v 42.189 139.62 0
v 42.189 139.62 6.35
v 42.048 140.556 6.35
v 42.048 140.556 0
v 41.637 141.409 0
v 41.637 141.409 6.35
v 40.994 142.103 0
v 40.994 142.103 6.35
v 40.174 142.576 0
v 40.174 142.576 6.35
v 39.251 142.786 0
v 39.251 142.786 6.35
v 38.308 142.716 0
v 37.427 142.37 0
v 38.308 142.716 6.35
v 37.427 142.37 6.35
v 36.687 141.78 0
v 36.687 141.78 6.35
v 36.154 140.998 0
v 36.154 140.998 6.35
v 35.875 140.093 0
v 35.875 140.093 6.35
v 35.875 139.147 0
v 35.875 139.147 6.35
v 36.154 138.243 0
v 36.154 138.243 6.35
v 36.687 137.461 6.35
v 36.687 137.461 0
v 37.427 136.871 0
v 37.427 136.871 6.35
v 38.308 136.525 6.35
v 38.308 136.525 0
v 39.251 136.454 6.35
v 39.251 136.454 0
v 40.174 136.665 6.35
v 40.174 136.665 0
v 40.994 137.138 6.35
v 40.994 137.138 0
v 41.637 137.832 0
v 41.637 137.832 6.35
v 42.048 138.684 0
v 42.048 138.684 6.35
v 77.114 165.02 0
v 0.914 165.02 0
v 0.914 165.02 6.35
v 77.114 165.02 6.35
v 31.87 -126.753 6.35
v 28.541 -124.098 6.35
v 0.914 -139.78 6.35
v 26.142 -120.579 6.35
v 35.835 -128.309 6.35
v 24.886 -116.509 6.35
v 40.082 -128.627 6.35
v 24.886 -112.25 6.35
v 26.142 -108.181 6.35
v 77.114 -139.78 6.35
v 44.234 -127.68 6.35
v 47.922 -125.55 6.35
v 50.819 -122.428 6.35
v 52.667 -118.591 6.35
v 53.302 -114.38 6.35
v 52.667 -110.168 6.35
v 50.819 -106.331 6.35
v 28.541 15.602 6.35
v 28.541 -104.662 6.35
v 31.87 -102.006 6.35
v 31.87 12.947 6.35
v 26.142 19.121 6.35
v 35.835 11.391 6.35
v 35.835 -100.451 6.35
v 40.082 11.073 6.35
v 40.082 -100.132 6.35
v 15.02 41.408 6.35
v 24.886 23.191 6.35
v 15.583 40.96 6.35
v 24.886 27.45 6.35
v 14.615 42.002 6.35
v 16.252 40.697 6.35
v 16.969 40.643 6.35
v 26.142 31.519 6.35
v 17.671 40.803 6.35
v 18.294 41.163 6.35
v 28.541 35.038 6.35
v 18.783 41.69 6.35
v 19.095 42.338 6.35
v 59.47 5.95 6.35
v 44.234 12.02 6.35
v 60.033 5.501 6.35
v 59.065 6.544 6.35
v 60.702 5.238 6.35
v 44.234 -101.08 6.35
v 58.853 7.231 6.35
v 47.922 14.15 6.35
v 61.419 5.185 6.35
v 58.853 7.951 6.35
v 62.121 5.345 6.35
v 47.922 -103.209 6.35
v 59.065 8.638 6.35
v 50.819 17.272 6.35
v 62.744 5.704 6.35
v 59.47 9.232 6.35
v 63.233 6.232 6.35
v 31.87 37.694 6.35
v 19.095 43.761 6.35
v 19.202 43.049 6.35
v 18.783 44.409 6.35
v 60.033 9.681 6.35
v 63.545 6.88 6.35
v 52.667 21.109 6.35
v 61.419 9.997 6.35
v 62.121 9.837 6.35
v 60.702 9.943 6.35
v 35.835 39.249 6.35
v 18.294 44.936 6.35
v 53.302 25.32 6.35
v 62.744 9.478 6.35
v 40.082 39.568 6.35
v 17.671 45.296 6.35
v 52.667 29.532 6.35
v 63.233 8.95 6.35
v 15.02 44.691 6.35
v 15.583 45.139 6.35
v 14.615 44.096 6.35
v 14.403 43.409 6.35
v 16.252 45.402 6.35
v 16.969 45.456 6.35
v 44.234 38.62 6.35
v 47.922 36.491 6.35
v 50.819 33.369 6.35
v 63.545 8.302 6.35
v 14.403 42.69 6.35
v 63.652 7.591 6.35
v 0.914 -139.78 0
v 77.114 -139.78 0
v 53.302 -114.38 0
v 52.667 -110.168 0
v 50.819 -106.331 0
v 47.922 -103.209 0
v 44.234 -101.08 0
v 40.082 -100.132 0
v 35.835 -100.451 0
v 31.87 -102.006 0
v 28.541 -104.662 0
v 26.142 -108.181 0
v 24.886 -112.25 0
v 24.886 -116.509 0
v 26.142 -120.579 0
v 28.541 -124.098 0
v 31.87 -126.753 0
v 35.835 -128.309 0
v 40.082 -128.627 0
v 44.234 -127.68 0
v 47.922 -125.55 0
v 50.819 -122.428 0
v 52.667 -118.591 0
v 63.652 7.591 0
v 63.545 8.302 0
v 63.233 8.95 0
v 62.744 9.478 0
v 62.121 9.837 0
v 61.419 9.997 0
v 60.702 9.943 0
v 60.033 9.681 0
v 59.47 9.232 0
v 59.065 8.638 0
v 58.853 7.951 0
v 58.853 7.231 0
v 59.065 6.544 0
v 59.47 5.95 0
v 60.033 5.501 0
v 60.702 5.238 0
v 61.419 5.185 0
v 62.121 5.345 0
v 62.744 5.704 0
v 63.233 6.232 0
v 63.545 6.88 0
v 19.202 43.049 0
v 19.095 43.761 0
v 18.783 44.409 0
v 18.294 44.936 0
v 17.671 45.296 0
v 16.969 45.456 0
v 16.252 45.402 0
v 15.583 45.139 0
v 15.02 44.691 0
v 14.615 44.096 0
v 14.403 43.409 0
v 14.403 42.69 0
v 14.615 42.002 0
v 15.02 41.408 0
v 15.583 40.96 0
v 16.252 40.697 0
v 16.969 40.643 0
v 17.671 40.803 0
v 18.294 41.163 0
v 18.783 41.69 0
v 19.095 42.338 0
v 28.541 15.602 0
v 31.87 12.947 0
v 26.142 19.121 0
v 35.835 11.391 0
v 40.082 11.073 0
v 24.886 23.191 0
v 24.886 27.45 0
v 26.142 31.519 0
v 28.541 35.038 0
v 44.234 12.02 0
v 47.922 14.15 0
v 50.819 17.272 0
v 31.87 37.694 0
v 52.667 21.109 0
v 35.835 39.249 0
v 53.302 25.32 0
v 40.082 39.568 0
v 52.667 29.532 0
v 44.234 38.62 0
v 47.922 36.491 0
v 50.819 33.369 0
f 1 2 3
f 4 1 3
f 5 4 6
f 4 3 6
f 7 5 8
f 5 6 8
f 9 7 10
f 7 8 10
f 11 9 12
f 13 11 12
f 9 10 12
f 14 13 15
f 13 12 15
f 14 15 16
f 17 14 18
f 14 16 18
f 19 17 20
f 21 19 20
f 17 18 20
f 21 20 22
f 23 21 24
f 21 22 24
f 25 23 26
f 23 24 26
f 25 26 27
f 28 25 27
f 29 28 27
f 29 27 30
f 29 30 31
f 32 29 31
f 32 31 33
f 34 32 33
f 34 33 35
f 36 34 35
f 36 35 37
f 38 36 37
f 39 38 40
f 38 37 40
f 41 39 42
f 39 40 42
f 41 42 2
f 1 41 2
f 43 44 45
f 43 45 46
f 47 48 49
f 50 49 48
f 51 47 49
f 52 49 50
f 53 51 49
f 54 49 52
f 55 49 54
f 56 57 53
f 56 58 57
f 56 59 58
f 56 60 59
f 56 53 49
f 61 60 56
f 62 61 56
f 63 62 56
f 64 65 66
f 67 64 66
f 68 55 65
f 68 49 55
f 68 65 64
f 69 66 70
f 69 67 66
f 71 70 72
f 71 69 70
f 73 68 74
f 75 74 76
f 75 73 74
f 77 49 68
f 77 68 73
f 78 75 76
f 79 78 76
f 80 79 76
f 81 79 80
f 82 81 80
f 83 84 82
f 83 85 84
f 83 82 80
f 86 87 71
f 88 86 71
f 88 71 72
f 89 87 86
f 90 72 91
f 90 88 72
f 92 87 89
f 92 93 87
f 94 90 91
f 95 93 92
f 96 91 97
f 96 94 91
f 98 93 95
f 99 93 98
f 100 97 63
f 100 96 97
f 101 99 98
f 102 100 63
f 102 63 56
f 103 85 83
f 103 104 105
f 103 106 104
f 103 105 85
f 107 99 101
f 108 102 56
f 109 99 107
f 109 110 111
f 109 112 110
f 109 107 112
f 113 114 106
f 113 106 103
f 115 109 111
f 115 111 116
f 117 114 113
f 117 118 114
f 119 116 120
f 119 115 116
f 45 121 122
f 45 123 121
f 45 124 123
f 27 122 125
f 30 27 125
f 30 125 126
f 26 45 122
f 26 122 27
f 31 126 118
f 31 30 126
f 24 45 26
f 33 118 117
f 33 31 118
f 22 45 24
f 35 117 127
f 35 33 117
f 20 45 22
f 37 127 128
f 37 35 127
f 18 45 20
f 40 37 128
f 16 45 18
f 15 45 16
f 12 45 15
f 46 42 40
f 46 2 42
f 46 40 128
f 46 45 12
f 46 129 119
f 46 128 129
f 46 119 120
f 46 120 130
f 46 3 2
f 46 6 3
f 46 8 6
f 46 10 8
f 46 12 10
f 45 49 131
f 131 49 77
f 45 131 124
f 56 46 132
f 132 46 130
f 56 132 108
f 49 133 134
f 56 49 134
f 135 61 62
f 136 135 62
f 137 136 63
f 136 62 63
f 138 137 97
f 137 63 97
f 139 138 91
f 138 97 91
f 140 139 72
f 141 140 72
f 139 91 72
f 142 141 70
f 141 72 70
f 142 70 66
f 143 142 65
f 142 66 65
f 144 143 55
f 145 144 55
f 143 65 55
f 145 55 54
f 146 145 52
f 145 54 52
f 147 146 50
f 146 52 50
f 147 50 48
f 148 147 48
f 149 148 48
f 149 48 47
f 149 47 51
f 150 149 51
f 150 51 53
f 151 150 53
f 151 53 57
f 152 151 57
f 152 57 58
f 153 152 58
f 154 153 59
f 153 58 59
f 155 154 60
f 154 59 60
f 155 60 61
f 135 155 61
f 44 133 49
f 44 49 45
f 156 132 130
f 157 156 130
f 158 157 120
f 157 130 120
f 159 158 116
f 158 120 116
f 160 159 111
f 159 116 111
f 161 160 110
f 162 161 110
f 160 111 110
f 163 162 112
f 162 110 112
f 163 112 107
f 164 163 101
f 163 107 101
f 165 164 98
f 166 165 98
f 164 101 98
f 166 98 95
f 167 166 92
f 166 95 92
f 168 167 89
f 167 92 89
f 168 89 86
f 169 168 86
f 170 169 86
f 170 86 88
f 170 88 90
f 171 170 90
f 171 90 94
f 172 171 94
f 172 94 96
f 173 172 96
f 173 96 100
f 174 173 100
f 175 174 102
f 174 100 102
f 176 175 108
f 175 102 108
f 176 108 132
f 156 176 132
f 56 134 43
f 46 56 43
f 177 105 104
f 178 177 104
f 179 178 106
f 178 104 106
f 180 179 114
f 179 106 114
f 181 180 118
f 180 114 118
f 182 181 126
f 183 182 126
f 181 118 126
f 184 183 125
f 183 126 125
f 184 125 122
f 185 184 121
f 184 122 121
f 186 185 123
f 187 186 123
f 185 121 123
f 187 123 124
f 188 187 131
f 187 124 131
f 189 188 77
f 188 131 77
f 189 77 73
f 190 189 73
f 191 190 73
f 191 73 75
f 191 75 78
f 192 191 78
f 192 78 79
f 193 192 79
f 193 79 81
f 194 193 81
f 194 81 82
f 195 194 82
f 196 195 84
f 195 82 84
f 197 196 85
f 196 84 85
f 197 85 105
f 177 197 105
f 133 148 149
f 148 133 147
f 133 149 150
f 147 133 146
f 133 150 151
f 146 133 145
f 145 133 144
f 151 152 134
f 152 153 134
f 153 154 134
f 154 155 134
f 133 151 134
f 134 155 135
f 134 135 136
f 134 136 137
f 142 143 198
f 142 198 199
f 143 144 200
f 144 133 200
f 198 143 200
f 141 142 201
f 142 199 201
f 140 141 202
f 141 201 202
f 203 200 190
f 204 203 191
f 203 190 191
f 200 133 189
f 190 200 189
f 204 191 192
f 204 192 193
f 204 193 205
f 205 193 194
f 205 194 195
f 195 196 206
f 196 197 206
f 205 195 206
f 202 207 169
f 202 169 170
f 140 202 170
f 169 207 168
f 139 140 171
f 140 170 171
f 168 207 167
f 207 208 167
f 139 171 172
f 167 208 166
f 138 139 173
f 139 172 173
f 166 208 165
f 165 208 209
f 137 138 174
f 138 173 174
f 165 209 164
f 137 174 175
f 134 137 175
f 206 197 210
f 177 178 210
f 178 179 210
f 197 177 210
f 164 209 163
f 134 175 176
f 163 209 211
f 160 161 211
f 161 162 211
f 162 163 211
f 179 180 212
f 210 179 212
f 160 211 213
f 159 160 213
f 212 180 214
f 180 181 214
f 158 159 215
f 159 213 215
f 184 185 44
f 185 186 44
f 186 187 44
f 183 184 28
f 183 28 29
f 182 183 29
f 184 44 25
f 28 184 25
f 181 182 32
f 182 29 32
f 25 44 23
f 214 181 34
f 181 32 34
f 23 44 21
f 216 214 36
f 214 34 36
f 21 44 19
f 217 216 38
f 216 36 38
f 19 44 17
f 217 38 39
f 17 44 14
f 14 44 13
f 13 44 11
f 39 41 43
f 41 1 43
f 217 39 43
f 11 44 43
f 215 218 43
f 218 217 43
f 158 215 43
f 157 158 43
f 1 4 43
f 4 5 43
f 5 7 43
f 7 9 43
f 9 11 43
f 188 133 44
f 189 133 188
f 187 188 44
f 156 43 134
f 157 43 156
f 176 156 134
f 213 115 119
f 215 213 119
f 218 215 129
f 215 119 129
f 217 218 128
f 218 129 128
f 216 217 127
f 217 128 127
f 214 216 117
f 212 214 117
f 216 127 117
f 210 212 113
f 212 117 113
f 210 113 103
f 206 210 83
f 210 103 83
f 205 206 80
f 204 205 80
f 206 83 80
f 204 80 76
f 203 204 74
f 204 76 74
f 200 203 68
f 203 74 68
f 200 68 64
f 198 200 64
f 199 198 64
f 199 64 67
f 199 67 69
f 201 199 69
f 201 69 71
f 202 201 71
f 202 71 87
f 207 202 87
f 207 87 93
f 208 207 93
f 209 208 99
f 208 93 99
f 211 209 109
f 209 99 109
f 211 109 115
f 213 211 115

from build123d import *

# Parameters (mm, degrees)
F0_W      = 76.2
F0_H      = 304.8
F1_DEPTH  = 6.35
F2_R      = 3.175
F3_DEPTH  = 6.35
F4_R      = 14.2875
F5_DEPTH  = 6.35
F6_R      = 14.2875
F7_DEPTH  = 6.35
F8_R      = 2.413
F10_DEPTH = 6.35
F9_R      = 2.413
F11_DEPTH = 6.35


with BuildPart() as f1:
    # F0 (on Top) → F1 (new body)
    with BuildSketch(Plane.XY):
        with Locations((39.014159, 12.620198)):
            Rectangle(F0_W, F0_H)
    extrude(amount=F1_DEPTH)

    # F2 (on face) → F3 (cut)
    with BuildSketch(Plane.XY.offset(6.35)):
        with Locations((39.014159, 139.620198)):
            Circle(F2_R)
    extrude(amount=-F3_DEPTH, mode=Mode.SUBTRACT)

    # F4 (on face) → F5 (cut)
    with BuildSketch(Plane.XY.offset(6.35)):
        with Locations((39.014159, -114.379802)):
            Circle(F4_R)
    extrude(amount=-F5_DEPTH, mode=Mode.SUBTRACT)

    # F6 (on face) → F7 (cut)
    with BuildSketch(Plane.XY.offset(6.35)):
        with Locations((39.014159, 25.320198)):
            Circle(F6_R)
    extrude(amount=-F7_DEPTH, mode=Mode.SUBTRACT)

    # F8 (on face) → F10 (cut)
    with BuildSketch(Plane.XY.offset(6.35)):
        with Locations((61.239159, 7.590998)):
            Circle(F8_R)
    extrude(amount=-F10_DEPTH, mode=Mode.SUBTRACT)

    # F9 (on face) → F11 (cut)
    with BuildSketch(Plane.XY.offset(6.35)):
        with Locations((16.789159, 43.049398)):
            Circle(F9_R)
    extrude(amount=-F11_DEPTH, mode=Mode.SUBTRACT)


solid = f1.part
